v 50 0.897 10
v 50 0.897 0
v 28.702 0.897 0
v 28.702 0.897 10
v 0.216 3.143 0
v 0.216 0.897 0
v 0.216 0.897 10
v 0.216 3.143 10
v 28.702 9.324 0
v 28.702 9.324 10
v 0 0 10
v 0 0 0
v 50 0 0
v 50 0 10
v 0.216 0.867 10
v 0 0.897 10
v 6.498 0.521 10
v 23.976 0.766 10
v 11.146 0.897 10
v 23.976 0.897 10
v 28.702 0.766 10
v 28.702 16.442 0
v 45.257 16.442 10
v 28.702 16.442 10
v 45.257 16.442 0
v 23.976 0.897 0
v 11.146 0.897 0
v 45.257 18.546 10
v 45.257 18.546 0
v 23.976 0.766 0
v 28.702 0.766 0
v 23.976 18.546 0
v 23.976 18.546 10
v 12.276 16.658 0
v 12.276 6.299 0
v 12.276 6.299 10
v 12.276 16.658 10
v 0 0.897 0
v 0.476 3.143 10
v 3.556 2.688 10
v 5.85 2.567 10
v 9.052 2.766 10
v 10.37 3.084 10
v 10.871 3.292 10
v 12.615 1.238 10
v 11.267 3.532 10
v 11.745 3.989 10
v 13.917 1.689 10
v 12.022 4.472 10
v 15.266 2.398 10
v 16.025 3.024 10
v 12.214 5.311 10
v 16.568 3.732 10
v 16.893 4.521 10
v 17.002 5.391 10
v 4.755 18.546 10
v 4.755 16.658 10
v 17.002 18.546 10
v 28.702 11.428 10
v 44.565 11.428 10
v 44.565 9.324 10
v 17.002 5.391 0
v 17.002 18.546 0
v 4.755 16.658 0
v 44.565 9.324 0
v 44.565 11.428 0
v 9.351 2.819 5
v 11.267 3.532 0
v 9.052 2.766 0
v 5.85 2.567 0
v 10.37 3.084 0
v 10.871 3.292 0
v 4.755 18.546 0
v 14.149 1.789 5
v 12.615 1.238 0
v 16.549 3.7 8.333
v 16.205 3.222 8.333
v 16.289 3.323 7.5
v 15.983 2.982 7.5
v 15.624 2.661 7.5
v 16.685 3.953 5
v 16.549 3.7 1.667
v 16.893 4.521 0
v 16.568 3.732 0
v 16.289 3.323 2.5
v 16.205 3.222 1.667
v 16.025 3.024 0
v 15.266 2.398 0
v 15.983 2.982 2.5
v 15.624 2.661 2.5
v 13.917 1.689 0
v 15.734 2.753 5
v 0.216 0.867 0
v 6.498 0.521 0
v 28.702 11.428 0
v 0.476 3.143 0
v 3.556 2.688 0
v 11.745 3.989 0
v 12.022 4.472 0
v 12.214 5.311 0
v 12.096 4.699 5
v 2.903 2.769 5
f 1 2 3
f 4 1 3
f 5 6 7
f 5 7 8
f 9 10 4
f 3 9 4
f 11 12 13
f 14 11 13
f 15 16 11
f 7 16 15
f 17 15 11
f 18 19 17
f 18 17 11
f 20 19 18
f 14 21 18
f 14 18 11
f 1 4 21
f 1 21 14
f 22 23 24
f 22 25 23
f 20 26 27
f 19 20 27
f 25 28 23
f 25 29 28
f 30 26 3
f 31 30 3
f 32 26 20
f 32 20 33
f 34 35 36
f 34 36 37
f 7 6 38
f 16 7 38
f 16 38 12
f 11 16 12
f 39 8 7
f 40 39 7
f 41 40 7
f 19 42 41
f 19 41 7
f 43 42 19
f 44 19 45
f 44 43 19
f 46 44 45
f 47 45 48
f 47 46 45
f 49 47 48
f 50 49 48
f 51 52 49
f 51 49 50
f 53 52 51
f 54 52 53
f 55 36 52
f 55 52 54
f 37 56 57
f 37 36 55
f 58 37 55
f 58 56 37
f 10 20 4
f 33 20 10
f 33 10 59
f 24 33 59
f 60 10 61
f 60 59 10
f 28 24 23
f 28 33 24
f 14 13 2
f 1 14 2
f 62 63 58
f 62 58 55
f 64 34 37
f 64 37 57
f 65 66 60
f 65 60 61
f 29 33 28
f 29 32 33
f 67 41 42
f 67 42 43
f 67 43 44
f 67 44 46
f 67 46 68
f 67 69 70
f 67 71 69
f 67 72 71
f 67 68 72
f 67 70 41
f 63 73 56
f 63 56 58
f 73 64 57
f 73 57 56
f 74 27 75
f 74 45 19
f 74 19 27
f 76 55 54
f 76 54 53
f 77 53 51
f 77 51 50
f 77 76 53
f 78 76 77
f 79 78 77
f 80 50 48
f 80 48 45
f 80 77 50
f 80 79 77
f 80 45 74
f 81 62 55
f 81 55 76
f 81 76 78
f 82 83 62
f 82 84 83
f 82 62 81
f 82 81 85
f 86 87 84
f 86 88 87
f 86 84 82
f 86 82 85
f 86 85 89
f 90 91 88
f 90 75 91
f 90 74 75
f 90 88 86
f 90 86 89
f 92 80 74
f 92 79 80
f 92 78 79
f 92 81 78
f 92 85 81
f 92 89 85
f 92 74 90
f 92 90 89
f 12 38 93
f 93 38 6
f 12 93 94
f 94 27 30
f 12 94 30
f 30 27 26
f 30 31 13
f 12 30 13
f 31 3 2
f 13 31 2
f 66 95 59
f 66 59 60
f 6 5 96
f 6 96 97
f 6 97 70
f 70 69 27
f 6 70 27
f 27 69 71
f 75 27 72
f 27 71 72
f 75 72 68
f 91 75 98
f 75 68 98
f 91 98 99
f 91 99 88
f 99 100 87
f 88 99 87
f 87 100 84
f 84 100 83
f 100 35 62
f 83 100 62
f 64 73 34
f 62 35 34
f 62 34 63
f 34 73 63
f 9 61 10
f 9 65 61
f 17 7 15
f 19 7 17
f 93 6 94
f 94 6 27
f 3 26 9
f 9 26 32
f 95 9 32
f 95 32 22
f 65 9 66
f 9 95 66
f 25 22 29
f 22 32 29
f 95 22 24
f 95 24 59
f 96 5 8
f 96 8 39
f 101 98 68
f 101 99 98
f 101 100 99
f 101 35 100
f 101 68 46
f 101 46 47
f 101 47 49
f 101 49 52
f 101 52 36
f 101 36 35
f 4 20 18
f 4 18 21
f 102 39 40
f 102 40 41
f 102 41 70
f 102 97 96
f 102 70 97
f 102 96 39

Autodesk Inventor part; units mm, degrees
ref_plane "YZ Plane" through (0, 0, 0) normal (1, 0, 0) x (0, 1, 0)
ref_plane "XZ Plane" through (0, 0, 0) normal (0, 1, 0) x (-1, 0, 0)
ref_plane "XY Plane" through (0, 0, 0) normal (0, 0, 1) x (1, 0, 0)
sketch "Sketch1" plane through (0, 0, 0) normal (0, 0, 1) x (1, 0, 0)
  line L0 (0, 0) -> (50, 0) construction
  line L1 (50, 0) -> (50, 20) construction
  line L2 (50, 0.7657) -> (0, 0.7657) construction
  line L3 (0, 20) -> (0, 0) construction
  spline S0 degree 2 poles (17.0019, 5.3908) (17.0019, 3.0567) (11.2962, 0.5208) (6.4982, 0.5208) knots 0 0 0 1 2 2 2
  spline S1 degree 2 poles (6.4982, 0.5208) (5.3455, 0.5208) (1.4985, 0.7225) (0.2161, 0.8666) knots 0 0 0 1 2 2 2
  line L4 (0.2161, 0.8666) -> (0.2161, 3.1431)
  line L5 (0.2161, 3.1431) -> (0.4755, 3.1431)
  spline S2 degree 2 poles (0.4755, 3.1431) (1.4553, 2.9702) (4.3513, 2.5668) (5.8498, 2.5668) knots 0 0 0 1 2 2 2
  spline S3 degree 2 poles (5.8498, 2.5668) (8.0543, 2.5668) (10.6478, 3.0711) (11.2674, 3.5321) knots 0 0 0 1 2 2 2
  spline S4 degree 2 poles (11.2674, 3.5321) (11.9158, 4.0076) (12.276, 5.3908) (12.276, 6.2986) knots 0 0 0 1 2 2 2
  line L6 (12.276, 6.2986) -> (12.276, 16.6582)
  line L7 (12.276, 16.6582) -> (4.7548, 16.6582)
  line L8 (4.7548, 16.6582) -> (4.7548, 18.5457)
  line L9 (4.7548, 18.5457) -> (17.0019, 18.5457)
  line L10 (17.0019, 18.5457) -> (17.0019, 5.3908)
  line L11 (45.2569, 16.4421) -> (28.7016, 16.4421)
  line L12 (28.7016, 16.4421) -> (28.7016, 11.428)
  line L13 (28.7016, 11.428) -> (44.5653, 11.428)
  line L14 (44.5653, 11.428) -> (44.5653, 9.3243)
  line L15 (44.5653, 9.3243) -> (28.7016, 9.3243)
  line L16 (28.7016, 9.3243) -> (28.7016, 0.7657)
  line L17 (28.7016, 0.7657) -> (23.9756, 0.7657)
  line L18 (23.9756, 0.7657) -> (23.9756, 18.5457)
  line L19 (23.9756, 18.5457) -> (45.2569, 18.5457)
  line L20 (45.2569, 18.5457) -> (45.2569, 16.4421)
  dimension "d0" = 50
  dimension "d1" = 20
extrude "Extrusion1" add sketch "Sketch1" along normal blind 10
sketch "Sketch2" plane through (0, 0, 0) normal (1, 0, 0) x (0, 1, 0)
  point P0 (0, 0)
sketch "Sketch3" plane through (0, 0, 0) normal (0, 0, 1) x (1, 0, 0)
  line L0 (0, 0) -> (50, 0)
  line L1 (50, 0) -> (50, 0.8967)
  line L2 (50, 0.8967) -> (0, 0.8967)
  line L3 (0, 0.8967) -> (0, 0)
  dimension "d4" = 50
extrude "Extrusion2" add sketch "Sketch3" along normal blind 10
properties part number "jf_inits"
